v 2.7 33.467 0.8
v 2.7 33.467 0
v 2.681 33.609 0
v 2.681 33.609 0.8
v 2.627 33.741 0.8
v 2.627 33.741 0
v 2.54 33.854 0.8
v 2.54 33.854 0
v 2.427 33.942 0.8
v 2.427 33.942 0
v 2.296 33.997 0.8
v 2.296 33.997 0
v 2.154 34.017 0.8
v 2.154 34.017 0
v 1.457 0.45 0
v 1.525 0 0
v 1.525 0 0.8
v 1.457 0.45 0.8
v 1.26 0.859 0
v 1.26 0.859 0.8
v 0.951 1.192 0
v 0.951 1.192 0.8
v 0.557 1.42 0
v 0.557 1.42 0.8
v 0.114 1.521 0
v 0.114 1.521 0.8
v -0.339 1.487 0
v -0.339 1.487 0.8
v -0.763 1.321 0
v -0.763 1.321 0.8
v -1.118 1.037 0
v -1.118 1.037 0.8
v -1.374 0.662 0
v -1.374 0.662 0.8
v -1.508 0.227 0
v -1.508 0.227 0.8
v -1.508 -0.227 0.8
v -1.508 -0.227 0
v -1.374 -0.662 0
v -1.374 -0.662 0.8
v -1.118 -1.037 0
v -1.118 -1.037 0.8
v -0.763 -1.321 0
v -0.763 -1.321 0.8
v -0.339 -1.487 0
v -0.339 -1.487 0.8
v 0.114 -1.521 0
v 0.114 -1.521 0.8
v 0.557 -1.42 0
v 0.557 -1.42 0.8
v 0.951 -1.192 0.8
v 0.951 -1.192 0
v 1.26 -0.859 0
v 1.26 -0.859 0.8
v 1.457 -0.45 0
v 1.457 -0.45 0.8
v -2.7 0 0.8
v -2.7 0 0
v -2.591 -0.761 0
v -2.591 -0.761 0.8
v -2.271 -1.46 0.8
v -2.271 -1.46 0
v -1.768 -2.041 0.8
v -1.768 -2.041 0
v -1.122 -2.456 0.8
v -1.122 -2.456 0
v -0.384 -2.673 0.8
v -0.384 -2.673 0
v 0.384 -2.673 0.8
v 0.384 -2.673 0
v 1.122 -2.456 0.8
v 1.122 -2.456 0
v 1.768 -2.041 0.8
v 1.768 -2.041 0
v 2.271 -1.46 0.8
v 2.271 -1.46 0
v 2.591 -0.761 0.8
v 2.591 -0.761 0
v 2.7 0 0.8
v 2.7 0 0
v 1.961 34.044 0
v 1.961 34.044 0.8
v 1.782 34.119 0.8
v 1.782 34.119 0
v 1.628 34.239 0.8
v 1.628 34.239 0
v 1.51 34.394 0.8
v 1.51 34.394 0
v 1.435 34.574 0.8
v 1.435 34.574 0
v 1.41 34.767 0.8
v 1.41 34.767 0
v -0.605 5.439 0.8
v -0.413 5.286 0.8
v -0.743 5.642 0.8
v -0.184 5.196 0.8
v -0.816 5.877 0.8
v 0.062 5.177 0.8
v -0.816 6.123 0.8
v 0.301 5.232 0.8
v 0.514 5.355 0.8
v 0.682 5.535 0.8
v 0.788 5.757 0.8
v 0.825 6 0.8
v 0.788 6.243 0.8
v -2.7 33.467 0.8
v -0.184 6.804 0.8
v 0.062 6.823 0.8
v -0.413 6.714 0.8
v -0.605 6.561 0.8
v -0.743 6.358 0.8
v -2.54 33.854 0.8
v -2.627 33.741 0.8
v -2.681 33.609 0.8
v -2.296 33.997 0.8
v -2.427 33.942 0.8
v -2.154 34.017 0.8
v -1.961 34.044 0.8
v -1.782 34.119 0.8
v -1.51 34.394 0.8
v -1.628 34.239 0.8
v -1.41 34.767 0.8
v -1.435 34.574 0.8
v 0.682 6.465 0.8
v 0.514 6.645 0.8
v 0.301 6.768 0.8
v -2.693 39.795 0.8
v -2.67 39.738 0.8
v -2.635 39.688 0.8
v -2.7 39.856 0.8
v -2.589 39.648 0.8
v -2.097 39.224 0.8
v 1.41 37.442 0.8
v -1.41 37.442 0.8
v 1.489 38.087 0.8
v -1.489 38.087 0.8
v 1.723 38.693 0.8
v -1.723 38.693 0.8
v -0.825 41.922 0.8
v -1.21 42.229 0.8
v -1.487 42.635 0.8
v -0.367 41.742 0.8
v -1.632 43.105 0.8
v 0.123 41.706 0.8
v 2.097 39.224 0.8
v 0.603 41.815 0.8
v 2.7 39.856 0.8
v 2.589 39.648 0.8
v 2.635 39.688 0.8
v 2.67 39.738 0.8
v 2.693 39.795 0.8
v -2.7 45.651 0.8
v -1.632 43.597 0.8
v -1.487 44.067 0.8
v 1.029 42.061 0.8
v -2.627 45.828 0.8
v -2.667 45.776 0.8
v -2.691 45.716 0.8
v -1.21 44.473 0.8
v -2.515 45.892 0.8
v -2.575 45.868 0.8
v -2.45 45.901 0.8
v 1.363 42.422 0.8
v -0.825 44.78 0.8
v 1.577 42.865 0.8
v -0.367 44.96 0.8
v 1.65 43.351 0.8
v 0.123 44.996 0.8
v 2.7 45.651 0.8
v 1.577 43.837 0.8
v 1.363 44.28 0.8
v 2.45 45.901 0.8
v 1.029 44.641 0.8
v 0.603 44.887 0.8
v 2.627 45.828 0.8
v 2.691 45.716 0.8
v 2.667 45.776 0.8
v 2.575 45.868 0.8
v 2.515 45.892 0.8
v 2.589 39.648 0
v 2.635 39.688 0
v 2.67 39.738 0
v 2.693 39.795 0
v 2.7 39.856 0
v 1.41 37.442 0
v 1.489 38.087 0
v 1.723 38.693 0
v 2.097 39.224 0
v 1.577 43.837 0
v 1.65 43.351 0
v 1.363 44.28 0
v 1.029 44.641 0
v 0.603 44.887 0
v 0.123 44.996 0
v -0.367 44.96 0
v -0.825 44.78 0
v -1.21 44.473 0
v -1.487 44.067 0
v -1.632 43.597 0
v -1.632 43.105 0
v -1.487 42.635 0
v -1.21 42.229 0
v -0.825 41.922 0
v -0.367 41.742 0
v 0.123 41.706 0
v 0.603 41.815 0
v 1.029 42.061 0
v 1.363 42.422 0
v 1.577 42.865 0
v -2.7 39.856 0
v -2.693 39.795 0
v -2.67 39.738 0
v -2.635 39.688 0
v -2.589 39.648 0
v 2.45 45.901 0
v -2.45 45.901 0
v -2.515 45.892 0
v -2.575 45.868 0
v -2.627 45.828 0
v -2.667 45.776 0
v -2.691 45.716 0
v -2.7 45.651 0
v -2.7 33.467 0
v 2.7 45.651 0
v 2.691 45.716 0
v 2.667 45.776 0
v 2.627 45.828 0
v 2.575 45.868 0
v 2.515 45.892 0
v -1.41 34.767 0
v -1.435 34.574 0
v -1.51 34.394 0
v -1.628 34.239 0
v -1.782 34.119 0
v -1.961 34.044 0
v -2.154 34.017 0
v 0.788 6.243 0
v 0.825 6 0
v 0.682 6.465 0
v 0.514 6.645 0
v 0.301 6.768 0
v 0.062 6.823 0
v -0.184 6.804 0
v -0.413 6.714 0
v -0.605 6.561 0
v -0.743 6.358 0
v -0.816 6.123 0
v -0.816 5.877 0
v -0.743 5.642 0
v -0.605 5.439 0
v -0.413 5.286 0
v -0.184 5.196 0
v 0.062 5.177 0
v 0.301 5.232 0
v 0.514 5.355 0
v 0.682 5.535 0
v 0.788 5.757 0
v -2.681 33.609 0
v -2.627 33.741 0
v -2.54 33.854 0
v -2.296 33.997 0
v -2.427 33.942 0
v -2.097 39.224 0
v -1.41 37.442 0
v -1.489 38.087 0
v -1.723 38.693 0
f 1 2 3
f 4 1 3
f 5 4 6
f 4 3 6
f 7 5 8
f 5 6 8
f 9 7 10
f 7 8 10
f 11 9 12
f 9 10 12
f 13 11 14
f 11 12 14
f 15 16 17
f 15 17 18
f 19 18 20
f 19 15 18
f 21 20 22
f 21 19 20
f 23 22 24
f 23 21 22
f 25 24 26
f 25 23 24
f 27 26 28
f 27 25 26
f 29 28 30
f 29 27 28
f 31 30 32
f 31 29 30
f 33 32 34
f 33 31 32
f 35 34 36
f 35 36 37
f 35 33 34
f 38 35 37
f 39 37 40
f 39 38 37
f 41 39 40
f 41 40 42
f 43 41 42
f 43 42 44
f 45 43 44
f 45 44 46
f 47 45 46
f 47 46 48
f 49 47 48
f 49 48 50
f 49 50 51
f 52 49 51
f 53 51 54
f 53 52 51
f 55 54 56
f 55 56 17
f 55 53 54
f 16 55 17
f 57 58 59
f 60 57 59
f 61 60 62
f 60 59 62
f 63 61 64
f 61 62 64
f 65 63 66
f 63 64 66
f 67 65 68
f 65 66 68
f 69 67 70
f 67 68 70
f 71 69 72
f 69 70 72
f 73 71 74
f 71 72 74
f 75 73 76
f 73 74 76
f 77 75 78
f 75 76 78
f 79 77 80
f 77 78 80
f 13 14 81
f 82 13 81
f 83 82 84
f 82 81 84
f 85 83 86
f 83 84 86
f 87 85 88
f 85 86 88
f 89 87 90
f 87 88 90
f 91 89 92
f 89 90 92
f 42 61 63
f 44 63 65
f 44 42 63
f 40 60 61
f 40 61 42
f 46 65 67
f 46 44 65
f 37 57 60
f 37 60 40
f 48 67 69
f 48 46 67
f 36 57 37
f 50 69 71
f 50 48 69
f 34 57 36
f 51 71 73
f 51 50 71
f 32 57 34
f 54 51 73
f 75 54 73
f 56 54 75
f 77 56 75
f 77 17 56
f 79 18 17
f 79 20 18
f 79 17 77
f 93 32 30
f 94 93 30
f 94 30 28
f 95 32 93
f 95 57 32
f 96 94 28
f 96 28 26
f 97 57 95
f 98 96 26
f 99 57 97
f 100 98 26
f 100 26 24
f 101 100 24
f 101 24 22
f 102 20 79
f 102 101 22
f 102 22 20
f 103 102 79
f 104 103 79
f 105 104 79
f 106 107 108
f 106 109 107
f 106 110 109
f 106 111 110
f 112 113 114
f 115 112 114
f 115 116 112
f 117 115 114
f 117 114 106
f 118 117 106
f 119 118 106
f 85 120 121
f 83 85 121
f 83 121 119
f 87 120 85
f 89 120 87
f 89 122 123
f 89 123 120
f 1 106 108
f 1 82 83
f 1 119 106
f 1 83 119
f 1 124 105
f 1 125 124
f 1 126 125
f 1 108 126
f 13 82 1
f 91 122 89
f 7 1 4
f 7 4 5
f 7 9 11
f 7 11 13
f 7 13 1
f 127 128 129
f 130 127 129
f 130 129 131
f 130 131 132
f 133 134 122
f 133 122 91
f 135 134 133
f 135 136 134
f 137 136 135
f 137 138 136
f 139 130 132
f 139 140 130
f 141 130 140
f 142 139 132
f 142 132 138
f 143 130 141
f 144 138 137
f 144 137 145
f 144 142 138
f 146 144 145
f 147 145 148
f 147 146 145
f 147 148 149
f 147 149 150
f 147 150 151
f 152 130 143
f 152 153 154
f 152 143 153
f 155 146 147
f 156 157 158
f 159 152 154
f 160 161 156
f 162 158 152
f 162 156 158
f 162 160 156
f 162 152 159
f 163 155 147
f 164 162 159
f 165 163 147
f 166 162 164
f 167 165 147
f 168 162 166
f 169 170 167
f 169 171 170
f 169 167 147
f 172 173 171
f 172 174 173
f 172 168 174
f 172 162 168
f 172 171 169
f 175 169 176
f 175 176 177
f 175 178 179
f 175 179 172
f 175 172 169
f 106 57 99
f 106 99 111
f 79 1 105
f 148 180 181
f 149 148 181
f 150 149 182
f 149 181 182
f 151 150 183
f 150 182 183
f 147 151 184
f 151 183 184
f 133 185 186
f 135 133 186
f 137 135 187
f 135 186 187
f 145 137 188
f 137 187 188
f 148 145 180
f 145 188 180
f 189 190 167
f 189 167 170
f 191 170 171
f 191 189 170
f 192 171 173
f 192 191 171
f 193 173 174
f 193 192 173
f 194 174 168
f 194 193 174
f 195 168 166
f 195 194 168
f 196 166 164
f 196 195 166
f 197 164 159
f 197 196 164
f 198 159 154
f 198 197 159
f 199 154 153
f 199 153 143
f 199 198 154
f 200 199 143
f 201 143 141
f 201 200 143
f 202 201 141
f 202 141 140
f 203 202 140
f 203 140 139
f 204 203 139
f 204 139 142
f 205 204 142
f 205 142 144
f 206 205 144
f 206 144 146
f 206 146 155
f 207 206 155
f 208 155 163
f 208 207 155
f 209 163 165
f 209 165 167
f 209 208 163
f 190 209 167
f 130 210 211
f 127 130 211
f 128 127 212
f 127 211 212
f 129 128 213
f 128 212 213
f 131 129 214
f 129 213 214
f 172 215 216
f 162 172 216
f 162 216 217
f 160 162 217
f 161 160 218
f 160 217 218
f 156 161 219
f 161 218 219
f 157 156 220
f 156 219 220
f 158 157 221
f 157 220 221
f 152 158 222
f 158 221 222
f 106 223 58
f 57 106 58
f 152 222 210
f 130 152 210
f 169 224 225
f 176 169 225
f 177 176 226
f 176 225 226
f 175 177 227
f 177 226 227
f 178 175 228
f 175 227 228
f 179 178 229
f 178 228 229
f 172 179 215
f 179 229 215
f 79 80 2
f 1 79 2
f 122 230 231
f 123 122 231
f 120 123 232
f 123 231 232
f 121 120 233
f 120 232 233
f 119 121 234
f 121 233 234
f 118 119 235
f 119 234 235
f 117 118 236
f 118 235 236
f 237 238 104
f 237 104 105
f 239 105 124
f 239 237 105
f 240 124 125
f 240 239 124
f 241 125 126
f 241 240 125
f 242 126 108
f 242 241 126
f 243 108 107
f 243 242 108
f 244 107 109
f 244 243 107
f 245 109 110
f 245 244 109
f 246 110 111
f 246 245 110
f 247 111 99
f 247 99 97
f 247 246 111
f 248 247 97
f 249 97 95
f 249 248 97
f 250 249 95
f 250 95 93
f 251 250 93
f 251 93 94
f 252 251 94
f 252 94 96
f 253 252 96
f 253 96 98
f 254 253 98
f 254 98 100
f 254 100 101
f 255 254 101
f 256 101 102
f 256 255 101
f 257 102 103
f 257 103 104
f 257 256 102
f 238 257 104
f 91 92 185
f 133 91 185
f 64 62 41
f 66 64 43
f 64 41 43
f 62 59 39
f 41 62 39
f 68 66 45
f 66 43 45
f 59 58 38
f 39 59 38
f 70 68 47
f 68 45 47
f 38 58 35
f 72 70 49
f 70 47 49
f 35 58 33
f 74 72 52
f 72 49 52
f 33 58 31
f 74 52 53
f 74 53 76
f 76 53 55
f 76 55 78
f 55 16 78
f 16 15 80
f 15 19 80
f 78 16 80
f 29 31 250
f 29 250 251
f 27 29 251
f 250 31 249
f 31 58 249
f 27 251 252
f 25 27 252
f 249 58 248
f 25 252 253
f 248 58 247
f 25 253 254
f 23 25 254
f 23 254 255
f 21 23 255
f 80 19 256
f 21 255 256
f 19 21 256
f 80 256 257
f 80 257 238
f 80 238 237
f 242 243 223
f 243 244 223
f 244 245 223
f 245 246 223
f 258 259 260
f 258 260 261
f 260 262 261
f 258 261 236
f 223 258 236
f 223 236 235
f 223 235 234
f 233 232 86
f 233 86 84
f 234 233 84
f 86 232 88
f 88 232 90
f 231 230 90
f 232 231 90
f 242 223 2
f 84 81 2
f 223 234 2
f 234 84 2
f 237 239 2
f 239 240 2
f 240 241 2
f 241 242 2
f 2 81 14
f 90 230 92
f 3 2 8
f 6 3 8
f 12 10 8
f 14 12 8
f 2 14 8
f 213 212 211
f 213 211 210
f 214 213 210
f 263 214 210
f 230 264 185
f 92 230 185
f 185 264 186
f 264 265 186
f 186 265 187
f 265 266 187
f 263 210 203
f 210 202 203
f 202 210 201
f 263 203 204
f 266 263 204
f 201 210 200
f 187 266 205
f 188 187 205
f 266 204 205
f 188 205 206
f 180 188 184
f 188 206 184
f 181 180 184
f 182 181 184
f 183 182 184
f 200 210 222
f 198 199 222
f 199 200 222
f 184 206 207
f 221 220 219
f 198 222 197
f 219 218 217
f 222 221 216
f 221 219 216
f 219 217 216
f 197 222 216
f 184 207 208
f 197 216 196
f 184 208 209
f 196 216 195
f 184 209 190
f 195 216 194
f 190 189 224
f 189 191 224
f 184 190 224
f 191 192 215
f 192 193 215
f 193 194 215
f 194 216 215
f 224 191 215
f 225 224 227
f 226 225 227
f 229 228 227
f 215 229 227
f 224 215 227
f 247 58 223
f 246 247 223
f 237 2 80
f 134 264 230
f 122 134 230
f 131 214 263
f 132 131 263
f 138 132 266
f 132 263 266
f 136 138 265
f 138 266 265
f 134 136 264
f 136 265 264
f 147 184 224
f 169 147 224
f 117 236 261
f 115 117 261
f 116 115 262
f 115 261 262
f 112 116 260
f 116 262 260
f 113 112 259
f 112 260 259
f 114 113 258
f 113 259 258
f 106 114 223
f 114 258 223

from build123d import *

# Parameters (mm, degrees)
SKETCH_2_R      = 1.525
SKETCH_2_R_2    = 0.825
SKETCH_2_R_3    = 1.65
EXTRUDE_1_DEPTH = 0.8


with BuildPart() as part:
    # 草图2 → 凸台-拉伸1 (new body)
    with BuildSketch(Plane.XY):
        with BuildLine():
            Line((-2.7, 33.467), (-2.7, 0))
            ThreePointArc((-2.7, 0), (0, -2.7), (2.7, 0))
            Line((2.7, 0), (2.7, 33.467))
            ThreePointArc((2.7, 33.467), (2.540401667, 33.854410039), (2.154230769, 34.016983728))
            ThreePointArc((2.154230769, 34.016983728), (1.627634091, 34.238675121), (1.41, 34.766961538))
            Line((1.41, 34.766961538), (1.41, 37.442))
            ThreePointArc((1.41, 37.442), (1.7232193, 38.69278444), (2.588946281, 39.648339169))
            ThreePointArc((2.588946281, 39.648339169), (2.670495544, 39.738349976), (2.7, 39.856170665))
            Line((2.7, 39.856170665), (2.7, 45.651))
            ThreePointArc((2.7, 45.651), (2.626776695, 45.827776695), (2.45, 45.901))
            Line((2.45, 45.901), (-2.45, 45.901))
            ThreePointArc((-2.45, 45.901), (-2.626776695, 45.827776695), (-2.7, 45.651))
            Line((-2.7, 45.651), (-2.7, 39.856170665))
            ThreePointArc((-2.7, 39.856170665), (-2.670495544, 39.738349976), (-2.588946281, 39.648339169))
            ThreePointArc((-2.588946281, 39.648339169), (-1.7232193, 38.69278444), (-1.41, 37.442))
            Line((-1.41, 37.442), (-1.41, 34.766961538))
            ThreePointArc((-1.41, 34.766961538), (-1.627634091, 34.238675121), (-2.154230769, 34.016983728))
            ThreePointArc((-2.154230769, 34.016983728), (-2.540401667, 33.854410039), (-2.7, 33.467))
        make_face()
        Circle(SKETCH_2_R, mode=Mode.SUBTRACT)
        with Locations((0, 6)):
            Circle(SKETCH_2_R_2, mode=Mode.SUBTRACT)
        with Locations((0, 43.351)):
            Circle(SKETCH_2_R_3, mode=Mode.SUBTRACT)
    extrude(amount=EXTRUDE_1_DEPTH)


solid = part.part
